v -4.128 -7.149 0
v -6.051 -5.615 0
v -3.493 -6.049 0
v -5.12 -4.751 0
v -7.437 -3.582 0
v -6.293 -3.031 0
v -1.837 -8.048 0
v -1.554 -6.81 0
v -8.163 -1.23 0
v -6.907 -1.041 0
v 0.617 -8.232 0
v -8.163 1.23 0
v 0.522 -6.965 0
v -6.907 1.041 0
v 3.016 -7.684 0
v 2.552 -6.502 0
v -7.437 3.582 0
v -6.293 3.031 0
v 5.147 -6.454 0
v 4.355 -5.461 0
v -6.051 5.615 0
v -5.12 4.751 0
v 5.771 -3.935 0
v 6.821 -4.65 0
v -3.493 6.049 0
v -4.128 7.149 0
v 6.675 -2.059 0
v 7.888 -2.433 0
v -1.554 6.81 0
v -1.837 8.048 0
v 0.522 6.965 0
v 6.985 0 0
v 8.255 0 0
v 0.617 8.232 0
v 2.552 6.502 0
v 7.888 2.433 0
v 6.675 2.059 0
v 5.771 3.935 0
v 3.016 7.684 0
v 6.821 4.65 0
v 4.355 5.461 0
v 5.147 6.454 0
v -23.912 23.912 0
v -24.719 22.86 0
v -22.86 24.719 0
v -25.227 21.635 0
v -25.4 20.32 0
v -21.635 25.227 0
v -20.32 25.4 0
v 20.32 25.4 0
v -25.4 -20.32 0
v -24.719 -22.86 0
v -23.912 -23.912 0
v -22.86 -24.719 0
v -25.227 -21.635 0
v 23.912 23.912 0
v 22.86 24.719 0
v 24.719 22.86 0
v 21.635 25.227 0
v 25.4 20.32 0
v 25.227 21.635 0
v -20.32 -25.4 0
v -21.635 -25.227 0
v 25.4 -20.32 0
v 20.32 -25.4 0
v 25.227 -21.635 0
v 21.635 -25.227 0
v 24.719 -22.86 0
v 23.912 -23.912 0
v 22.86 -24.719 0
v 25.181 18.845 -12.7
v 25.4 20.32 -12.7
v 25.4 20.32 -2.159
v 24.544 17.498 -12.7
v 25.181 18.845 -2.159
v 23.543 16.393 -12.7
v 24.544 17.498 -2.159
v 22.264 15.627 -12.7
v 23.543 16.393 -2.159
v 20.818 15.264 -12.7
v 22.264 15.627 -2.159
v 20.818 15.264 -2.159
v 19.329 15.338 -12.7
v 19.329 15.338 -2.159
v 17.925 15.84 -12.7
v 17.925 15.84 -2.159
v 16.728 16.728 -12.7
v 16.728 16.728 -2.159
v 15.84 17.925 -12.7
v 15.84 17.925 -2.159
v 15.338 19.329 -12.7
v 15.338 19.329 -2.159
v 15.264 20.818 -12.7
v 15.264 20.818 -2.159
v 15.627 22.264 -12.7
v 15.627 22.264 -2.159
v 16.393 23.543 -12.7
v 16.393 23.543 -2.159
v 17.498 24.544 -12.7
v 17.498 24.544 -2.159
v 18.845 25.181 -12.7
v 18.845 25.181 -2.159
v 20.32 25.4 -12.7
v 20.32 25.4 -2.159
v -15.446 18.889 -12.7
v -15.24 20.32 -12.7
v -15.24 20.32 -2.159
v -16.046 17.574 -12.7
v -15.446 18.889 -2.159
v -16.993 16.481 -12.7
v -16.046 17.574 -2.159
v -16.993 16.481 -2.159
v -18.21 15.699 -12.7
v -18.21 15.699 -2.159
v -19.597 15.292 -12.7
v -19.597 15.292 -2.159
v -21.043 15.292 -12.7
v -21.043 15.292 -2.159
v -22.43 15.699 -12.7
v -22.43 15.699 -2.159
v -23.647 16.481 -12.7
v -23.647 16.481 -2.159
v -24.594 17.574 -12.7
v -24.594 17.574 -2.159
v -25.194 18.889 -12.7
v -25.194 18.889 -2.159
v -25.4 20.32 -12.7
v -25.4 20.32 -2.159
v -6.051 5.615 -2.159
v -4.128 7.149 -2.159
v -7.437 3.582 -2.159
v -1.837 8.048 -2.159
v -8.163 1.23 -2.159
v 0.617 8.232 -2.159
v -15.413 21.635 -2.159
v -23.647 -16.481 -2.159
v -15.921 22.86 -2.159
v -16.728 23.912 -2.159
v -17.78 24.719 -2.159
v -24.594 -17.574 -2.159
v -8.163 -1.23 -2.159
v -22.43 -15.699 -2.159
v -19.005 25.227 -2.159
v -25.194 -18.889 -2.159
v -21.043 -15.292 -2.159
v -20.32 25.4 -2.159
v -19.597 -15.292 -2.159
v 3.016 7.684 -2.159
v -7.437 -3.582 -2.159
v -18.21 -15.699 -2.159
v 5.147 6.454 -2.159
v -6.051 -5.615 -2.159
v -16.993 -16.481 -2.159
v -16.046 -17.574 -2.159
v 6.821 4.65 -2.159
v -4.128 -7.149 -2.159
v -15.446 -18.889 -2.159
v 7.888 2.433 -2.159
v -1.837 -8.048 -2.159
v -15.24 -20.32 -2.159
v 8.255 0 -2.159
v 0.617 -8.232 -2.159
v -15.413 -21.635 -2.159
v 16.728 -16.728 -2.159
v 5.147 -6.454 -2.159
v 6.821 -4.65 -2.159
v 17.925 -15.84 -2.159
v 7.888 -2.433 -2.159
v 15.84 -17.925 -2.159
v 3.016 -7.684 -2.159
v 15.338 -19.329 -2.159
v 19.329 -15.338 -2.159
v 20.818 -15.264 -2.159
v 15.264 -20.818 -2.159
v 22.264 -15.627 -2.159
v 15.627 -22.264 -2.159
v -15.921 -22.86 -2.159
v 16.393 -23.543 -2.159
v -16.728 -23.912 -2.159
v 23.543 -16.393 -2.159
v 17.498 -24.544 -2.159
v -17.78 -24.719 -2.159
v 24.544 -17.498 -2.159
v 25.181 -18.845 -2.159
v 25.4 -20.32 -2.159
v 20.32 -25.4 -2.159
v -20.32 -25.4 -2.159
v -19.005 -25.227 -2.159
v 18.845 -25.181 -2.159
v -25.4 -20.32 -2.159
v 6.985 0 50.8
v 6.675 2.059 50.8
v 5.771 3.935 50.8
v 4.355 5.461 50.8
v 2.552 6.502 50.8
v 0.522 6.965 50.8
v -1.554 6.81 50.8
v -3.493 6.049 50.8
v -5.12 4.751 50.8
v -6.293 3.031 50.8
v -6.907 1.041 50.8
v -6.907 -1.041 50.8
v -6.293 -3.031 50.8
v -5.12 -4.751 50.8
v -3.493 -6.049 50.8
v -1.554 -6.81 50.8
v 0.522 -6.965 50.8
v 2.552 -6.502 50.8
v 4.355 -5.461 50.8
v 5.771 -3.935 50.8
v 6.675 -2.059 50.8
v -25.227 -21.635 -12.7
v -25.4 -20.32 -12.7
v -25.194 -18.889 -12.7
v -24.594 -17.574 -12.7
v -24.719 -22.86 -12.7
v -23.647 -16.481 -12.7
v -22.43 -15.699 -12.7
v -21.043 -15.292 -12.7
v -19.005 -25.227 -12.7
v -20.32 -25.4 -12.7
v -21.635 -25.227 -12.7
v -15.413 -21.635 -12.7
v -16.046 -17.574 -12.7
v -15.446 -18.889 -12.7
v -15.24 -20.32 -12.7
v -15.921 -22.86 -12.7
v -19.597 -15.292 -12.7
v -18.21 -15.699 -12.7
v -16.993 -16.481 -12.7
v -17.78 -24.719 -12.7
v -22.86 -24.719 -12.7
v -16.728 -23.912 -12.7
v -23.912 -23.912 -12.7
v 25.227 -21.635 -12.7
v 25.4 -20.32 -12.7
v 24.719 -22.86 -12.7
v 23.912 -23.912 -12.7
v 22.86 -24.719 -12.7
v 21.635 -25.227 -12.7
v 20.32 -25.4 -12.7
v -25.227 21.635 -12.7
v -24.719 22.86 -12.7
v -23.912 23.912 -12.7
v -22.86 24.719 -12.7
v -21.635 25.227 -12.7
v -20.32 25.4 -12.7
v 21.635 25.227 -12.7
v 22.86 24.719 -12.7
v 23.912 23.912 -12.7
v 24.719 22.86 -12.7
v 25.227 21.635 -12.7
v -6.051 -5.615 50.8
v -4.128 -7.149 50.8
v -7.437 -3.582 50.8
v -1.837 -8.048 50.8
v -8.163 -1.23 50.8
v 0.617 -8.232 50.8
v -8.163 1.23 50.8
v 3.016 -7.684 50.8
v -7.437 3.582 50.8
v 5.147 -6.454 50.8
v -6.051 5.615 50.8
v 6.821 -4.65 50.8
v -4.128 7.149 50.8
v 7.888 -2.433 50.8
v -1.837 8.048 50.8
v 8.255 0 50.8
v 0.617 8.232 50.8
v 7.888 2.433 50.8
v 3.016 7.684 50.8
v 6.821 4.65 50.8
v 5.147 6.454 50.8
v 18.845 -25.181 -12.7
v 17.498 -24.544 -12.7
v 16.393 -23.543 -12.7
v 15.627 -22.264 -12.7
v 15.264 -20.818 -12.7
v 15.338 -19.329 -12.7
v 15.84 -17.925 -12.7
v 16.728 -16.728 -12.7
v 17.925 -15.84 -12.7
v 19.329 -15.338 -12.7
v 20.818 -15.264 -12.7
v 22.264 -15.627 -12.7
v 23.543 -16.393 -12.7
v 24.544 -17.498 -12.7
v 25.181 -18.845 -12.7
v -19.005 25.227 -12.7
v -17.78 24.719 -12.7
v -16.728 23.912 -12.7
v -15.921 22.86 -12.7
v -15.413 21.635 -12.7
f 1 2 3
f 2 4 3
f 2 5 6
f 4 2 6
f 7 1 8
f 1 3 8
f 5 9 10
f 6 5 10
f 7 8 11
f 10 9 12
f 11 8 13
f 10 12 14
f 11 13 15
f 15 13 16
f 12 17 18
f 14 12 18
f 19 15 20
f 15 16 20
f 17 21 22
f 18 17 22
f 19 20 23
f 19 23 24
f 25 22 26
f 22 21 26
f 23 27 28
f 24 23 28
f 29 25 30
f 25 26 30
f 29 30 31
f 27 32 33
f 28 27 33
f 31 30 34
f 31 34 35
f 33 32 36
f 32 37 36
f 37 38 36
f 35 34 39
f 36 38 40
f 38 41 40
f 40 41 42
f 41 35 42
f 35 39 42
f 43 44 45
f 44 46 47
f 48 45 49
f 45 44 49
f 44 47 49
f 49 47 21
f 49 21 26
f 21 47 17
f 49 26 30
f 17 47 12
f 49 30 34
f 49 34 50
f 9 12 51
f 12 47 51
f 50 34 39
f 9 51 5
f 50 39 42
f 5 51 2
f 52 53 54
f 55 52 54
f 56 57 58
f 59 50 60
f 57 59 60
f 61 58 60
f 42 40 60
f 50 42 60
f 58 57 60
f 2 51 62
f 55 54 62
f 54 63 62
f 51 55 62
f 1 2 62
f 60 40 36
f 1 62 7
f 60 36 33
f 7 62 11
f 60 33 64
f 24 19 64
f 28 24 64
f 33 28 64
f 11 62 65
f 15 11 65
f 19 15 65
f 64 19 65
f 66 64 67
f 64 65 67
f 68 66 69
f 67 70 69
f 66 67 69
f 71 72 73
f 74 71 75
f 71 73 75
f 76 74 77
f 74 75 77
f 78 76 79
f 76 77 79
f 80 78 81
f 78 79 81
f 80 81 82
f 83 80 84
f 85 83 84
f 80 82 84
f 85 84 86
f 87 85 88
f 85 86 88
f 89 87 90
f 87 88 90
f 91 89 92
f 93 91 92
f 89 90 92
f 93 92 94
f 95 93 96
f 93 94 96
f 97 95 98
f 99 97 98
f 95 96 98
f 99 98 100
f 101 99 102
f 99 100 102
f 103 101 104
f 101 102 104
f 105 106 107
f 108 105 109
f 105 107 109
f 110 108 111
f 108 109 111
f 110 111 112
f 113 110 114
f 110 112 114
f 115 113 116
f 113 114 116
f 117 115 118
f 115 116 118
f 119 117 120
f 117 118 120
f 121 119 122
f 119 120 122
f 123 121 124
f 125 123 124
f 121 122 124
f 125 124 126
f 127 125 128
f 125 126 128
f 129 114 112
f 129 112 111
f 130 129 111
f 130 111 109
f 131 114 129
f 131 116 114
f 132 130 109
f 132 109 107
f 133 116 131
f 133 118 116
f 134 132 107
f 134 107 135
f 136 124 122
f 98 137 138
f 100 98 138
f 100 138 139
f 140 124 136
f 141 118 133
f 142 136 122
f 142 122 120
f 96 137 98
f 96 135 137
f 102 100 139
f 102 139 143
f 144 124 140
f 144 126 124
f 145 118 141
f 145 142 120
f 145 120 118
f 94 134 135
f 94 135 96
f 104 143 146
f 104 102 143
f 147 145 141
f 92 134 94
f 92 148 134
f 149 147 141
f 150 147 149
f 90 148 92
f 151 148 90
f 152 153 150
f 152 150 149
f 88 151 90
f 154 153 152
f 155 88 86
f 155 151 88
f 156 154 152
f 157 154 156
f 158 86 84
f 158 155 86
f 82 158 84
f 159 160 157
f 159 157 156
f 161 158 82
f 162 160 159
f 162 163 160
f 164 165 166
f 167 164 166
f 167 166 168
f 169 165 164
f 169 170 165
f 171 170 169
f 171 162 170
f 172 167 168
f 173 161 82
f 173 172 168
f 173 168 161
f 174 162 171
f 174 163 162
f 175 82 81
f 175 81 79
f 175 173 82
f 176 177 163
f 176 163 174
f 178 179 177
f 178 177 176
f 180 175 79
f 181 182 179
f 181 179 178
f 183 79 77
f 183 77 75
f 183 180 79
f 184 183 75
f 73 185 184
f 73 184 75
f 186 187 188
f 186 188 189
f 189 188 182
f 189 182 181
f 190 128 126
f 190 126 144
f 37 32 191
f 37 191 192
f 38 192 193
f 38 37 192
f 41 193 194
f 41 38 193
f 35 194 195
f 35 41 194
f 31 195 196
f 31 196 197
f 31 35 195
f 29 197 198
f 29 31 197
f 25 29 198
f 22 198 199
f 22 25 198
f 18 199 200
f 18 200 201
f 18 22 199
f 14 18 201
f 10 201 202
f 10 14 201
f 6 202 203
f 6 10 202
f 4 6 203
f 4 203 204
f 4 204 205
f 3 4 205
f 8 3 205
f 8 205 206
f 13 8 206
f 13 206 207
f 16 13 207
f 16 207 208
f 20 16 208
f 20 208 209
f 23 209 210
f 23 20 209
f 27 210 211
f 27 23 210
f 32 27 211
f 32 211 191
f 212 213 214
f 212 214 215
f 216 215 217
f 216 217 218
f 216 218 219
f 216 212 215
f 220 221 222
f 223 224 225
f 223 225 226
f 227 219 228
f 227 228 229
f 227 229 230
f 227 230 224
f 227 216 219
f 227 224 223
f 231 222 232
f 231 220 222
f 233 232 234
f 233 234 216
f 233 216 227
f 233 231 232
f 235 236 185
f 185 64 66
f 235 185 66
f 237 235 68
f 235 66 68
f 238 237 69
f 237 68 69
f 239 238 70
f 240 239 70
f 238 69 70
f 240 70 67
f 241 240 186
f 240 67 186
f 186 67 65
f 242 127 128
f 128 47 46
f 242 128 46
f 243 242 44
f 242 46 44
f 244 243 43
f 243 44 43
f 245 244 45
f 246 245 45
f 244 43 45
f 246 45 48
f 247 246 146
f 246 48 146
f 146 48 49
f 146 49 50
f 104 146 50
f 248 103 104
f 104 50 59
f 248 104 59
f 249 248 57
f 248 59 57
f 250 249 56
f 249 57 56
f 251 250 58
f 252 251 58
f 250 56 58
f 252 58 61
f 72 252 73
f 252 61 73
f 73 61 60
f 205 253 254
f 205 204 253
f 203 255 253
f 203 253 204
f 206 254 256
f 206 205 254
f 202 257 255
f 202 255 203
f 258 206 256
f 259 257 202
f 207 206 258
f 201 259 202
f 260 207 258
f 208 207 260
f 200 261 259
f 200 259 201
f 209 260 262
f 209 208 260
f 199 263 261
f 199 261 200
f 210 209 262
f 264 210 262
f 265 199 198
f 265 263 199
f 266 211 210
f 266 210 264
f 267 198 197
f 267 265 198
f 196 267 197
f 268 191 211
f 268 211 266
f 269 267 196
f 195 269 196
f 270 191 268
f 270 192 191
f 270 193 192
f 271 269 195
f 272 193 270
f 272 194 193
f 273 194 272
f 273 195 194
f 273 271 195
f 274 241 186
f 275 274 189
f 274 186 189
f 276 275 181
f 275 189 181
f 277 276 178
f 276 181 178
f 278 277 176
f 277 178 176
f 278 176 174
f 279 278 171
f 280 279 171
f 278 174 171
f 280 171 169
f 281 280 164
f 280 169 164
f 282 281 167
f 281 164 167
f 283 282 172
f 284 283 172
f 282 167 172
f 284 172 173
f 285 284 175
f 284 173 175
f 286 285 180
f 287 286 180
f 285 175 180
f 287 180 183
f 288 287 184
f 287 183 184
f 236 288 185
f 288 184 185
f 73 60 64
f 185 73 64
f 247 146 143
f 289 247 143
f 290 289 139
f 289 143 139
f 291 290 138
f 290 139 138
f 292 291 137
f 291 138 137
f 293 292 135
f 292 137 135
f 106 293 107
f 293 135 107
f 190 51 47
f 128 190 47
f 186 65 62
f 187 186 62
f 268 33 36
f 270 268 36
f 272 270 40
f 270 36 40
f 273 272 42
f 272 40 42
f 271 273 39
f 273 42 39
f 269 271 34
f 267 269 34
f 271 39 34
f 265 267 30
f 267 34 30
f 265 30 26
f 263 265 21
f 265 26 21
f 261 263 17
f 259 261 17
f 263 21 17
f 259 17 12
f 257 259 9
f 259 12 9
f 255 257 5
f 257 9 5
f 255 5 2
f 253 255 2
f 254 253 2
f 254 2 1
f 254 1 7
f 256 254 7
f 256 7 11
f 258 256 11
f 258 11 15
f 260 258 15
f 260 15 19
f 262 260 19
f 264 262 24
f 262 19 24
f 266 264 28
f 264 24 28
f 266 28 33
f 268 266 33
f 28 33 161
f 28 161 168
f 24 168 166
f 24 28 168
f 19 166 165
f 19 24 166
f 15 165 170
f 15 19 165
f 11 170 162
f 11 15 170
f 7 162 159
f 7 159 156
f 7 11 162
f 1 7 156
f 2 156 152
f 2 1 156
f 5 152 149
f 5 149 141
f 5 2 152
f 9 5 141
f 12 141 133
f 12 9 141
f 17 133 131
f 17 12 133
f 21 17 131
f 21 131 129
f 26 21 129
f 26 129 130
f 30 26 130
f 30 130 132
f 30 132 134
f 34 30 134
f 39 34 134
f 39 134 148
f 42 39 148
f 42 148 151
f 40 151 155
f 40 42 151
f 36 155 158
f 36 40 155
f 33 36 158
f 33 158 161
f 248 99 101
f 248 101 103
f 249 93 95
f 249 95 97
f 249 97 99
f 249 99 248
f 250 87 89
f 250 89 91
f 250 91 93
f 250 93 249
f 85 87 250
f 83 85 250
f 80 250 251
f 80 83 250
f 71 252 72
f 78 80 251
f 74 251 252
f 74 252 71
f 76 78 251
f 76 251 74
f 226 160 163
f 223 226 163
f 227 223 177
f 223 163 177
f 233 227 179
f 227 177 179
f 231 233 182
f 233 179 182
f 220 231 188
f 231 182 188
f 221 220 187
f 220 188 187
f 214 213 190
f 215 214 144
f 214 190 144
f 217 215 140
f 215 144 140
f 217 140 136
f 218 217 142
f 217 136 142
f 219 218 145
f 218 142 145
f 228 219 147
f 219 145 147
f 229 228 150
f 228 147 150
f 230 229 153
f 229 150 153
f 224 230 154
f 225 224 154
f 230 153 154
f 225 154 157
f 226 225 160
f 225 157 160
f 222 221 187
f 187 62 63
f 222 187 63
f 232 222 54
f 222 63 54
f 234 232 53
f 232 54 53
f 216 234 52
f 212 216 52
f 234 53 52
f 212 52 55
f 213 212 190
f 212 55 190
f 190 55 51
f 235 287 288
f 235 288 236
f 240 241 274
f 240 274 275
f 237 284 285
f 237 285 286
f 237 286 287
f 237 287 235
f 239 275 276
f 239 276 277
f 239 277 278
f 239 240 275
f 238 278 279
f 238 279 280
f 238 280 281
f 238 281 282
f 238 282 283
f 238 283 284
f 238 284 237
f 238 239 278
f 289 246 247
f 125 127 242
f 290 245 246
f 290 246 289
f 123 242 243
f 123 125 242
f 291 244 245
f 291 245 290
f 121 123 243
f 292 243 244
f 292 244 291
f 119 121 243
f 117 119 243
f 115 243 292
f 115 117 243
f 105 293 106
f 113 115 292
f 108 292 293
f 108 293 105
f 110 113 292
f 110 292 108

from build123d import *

# Parameters (mm, degrees)
F0_R     = 8.255
F0_R_2   = 6.985
F1_DEPTH = 50.8
F3_DEPTH = 12.7
F2_R     = 8.255
F4_DEPTH = 2.159


with BuildPart() as f1:
    # F0 (on Top) → F1 (new body)
    with BuildSketch(Plane.XY):
        Circle(F0_R)
        Circle(F0_R_2, mode=Mode.SUBTRACT)
    extrude(amount=F1_DEPTH)



with BuildPart() as f3:
    # F2 (on face) → F3 (new body)
    with BuildSketch(Plane(origin=(0, 0, 0), x_dir=(1, 0, 0), z_dir=(0, 0, -1))):
        with BuildLine():
            ThreePointArc((-20.32, 25.4), (-23.9121024484, 23.9121024484), (-25.4, 20.32))
            ThreePointArc((-25.4, 20.32), (-20.32, 15.24), (-15.24, 20.32))
            ThreePointArc((-15.24, 20.32), (-16.7278975516, 23.9121024484), (-20.32, 25.4))
        make_face()
    extrude(amount=F3_DEPTH)


with BuildPart() as f3b:
    # F2 (on face) → F3, piece 2 (new body)
    with BuildSketch(Plane(origin=(0, 0, 0), x_dir=(1, 0, 0), z_dir=(0, 0, -1))):
        with BuildLine():
            ThreePointArc((20.32, 25.4), (16.7278975516, 16.7278975516), (25.4, 20.32))
            ThreePointArc((25.4, 20.32), (23.9121024484, 23.9121024484), (20.32, 25.4))
        make_face()
    extrude(amount=F3_DEPTH)


with BuildPart() as f3c:
    # F2 (on face) → F3, piece 3 (new body)
    with BuildSketch(Plane(origin=(0, 0, 0), x_dir=(1, 0, 0), z_dir=(0, 0, -1))):
        with BuildLine():
            ThreePointArc((25.4, -20.32), (16.7278975516, -16.7278975516), (20.32, -25.4))
            ThreePointArc((20.32, -25.4), (23.9121024484, -23.9121024484), (25.4, -20.32))
        make_face()
    extrude(amount=F3_DEPTH)


with BuildPart() as f3d:
    # F2 (on face) → F3, piece 4 (new body)
    with BuildSketch(Plane(origin=(0, 0, 0), x_dir=(1, 0, 0), z_dir=(0, 0, -1))):
        with BuildLine():
            ThreePointArc((-25.4, -20.32), (-23.9121024484, -23.9121024484), (-20.32, -25.4))
            ThreePointArc((-20.32, -25.4), (-16.7278975516, -23.9121024484), (-15.24, -20.32))
            ThreePointArc((-15.24, -20.32), (-20.32, -15.24), (-25.4, -20.32))
        make_face()
    extrude(amount=F3_DEPTH)


with BuildPart() as f1_1:
    add(f1.part)

    add(f3.part)  # F4 merges F3

    add(f3b.part)  # F4 merges F3b

    add(f3c.part)  # F4 merges F3c

    add(f3d.part)  # F4 merges F3d
    # F2 (on face) → F4 (join)
    with BuildSketch(Plane(origin=(0, 0, 0), x_dir=(1, 0, 0), z_dir=(0, 0, -1))):
        with BuildLine():
            Line((-20.32, -25.4), (20.32, -25.4))
            ThreePointArc((20.32, -25.4), (16.7278975516, -16.7278975516), (25.4, -20.32))
            Line((25.4, -20.32), (25.4, 20.32))
            ThreePointArc((25.4, 20.32), (16.7278975516, 16.7278975516), (20.32, 25.4))
            Line((20.32, 25.4), (-20.32, 25.4))
            ThreePointArc((-20.32, 25.4), (-16.7278975516, 23.9121024484), (-15.24, 20.32))
            ThreePointArc((-15.24, 20.32), (-20.32, 15.24), (-25.4, 20.32))
            Line((-25.4, 20.32), (-25.4, -20.32))
            ThreePointArc((-25.4, -20.32), (-20.32, -15.24), (-15.24, -20.32))
            ThreePointArc((-15.24, -20.32), (-16.7278975516, -23.9121024484), (-20.32, -25.4))
        make_face()
        Circle(F2_R, mode=Mode.SUBTRACT)
    extrude(amount=F4_DEPTH)


solid = f1_1.part
